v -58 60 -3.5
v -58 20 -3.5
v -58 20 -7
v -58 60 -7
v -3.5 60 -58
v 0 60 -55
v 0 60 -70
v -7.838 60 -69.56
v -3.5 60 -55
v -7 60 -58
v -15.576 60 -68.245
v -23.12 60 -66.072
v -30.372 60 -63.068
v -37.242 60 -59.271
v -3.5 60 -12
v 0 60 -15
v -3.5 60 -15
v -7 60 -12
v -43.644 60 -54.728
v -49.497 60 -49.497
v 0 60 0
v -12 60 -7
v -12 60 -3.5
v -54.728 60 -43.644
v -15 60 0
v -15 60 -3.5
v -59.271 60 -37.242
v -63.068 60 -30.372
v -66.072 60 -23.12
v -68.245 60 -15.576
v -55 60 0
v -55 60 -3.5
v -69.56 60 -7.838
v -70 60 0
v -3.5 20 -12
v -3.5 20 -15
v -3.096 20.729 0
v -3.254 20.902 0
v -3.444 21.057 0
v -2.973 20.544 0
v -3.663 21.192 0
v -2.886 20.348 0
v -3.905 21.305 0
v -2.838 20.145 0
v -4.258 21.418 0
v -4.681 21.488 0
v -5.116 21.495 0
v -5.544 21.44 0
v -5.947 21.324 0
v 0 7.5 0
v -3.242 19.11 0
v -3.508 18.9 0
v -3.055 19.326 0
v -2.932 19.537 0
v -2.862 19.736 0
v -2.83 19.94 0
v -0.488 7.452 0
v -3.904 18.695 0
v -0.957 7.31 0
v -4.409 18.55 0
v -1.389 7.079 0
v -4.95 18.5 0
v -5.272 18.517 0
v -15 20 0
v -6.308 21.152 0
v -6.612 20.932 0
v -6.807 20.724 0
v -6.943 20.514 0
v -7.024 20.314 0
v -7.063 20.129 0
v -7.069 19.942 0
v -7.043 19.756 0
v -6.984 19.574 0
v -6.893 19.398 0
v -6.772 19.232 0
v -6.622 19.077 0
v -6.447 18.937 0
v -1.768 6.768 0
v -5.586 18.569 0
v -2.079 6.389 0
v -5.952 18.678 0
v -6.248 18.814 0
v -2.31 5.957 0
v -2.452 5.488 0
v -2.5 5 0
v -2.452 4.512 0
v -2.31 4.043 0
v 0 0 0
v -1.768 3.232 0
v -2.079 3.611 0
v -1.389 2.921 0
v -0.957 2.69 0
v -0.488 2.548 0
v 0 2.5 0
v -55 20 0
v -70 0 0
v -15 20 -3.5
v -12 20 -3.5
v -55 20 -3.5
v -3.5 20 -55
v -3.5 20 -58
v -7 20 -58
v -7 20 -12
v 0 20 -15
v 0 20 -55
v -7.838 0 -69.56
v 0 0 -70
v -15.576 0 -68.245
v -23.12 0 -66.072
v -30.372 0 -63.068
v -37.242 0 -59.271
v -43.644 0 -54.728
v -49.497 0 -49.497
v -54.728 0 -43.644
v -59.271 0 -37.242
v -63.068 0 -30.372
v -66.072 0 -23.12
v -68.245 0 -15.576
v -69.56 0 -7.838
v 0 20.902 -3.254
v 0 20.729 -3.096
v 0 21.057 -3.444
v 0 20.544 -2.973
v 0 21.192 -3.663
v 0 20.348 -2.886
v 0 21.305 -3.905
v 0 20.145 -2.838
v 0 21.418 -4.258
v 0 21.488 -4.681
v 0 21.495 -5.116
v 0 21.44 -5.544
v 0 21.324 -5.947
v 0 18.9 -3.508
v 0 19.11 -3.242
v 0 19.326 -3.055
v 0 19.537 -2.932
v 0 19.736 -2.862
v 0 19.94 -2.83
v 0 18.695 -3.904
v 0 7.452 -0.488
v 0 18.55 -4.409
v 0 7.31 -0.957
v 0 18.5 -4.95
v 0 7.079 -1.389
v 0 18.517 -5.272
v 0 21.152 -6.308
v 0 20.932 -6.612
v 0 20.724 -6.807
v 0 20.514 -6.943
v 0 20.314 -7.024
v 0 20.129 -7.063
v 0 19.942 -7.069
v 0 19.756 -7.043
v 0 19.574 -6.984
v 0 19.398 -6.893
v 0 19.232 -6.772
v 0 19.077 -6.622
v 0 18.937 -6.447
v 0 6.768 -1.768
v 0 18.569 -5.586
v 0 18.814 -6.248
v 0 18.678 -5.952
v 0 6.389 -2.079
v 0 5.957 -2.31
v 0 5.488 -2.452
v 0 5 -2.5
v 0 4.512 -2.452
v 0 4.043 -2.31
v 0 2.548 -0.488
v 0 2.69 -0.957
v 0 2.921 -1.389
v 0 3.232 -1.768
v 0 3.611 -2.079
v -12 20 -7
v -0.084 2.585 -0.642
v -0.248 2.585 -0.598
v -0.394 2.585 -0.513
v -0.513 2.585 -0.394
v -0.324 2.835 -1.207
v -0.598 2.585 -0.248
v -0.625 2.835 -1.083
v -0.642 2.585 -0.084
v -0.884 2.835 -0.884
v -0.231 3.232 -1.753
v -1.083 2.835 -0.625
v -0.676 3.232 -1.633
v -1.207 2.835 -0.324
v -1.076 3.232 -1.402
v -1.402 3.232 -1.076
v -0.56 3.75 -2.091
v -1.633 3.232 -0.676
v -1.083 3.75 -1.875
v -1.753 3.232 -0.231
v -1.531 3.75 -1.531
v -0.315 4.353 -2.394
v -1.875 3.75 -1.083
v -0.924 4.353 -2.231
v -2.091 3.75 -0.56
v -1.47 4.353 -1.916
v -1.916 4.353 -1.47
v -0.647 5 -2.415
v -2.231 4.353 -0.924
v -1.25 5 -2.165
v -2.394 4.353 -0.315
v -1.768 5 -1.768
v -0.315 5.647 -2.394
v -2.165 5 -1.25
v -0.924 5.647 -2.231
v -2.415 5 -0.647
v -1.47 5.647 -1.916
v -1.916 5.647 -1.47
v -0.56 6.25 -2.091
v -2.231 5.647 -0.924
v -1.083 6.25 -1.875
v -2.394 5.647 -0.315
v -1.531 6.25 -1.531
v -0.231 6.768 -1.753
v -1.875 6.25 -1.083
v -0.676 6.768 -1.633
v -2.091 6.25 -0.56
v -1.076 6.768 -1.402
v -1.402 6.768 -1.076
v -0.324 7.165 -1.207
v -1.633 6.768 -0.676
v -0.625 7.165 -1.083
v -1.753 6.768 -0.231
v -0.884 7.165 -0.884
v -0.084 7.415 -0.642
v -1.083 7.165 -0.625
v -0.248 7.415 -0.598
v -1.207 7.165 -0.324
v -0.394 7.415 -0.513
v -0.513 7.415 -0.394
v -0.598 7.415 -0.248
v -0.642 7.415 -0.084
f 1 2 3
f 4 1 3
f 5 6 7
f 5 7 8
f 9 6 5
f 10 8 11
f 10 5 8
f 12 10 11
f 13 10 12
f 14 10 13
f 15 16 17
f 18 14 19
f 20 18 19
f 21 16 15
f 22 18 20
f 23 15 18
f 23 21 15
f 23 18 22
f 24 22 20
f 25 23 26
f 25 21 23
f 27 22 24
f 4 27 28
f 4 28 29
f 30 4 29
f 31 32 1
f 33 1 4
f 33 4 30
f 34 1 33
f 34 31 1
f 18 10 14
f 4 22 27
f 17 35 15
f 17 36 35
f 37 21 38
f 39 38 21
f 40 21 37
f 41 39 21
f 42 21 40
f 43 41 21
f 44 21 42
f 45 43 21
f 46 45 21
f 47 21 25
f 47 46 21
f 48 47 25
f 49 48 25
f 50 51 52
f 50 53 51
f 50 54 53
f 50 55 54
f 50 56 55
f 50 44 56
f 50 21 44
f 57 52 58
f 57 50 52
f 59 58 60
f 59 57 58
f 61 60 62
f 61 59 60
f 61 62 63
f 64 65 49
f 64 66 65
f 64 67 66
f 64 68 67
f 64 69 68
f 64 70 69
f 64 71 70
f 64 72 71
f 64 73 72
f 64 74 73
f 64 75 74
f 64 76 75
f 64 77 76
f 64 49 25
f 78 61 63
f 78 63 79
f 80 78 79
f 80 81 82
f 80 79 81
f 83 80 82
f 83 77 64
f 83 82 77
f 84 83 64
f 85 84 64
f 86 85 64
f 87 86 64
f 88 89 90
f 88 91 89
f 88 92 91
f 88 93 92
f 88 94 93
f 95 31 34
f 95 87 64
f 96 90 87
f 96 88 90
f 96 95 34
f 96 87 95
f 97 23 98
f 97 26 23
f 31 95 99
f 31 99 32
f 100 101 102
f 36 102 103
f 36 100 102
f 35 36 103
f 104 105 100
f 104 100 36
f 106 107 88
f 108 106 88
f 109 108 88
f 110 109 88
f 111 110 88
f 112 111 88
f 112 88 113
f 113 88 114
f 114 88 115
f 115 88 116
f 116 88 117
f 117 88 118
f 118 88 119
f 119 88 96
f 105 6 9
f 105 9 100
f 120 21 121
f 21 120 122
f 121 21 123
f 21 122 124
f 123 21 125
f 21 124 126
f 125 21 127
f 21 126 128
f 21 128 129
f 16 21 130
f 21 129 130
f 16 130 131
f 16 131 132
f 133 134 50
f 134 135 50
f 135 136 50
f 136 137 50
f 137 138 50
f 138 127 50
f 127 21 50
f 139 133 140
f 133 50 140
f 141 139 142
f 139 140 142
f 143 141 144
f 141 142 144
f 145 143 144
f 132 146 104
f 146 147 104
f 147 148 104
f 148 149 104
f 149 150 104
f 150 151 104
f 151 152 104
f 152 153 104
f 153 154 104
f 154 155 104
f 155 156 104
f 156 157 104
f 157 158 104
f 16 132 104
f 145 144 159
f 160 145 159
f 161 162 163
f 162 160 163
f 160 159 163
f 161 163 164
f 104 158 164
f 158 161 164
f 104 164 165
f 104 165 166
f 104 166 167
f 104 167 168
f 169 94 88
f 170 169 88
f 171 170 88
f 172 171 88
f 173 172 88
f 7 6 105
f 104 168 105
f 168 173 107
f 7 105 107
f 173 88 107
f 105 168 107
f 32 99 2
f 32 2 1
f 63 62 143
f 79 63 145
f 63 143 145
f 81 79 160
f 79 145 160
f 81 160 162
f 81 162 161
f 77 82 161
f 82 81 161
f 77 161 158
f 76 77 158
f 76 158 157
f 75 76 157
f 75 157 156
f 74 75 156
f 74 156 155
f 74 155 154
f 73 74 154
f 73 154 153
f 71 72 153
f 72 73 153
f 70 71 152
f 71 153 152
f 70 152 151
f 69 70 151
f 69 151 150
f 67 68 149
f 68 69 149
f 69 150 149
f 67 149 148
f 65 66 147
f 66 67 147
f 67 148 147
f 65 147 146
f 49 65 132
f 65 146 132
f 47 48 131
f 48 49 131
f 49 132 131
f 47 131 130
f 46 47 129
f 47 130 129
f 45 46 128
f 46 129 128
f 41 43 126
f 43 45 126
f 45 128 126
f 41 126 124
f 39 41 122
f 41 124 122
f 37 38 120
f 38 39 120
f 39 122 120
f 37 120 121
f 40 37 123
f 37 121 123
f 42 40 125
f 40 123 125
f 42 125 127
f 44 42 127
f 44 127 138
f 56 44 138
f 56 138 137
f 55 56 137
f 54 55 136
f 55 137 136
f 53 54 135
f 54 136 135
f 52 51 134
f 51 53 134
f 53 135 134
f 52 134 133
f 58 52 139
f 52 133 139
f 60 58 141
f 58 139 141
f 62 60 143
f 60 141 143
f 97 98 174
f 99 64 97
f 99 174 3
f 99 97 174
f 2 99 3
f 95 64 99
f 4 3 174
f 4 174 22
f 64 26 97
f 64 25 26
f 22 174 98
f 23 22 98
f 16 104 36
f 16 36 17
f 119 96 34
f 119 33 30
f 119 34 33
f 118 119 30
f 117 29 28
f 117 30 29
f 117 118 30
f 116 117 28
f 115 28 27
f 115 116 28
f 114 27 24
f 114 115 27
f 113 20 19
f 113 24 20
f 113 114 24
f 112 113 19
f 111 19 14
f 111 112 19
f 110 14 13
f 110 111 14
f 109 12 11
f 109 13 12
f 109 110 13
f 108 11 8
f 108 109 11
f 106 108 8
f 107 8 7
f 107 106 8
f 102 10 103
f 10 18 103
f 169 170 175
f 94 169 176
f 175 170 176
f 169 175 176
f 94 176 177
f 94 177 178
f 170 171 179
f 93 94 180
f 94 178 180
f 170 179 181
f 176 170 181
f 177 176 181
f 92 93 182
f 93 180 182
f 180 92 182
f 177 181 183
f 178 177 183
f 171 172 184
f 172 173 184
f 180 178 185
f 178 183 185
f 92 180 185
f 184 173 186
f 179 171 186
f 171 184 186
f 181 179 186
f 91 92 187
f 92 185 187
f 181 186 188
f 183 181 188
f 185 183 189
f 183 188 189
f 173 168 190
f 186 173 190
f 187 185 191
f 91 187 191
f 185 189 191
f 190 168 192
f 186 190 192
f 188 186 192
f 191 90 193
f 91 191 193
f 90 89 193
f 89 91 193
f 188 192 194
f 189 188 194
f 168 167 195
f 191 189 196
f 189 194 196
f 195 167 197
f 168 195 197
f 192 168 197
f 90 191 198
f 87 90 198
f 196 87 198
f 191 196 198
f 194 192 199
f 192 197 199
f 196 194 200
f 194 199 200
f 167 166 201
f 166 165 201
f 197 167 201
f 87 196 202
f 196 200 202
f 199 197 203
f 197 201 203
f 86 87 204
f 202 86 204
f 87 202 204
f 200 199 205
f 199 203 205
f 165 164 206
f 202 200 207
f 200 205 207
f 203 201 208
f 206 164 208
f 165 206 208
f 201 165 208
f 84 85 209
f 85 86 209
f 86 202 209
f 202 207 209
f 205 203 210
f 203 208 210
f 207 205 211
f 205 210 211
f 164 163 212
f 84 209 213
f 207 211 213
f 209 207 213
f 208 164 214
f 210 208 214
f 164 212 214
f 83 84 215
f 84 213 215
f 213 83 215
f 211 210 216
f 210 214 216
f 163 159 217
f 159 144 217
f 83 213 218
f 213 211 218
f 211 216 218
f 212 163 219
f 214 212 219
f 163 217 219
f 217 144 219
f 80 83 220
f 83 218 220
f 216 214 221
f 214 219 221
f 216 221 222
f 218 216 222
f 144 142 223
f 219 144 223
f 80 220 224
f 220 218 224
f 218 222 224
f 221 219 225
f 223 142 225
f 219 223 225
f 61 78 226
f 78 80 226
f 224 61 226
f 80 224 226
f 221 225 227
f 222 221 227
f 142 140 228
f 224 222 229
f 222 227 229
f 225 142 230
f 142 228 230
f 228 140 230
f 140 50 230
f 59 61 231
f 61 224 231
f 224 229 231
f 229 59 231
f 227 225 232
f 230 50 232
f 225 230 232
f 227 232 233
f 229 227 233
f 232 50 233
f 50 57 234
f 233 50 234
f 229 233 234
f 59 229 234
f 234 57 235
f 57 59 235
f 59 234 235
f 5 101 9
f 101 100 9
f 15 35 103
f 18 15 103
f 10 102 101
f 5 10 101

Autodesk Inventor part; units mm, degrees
ref_plane "YZ Plane" through (0, 0, 0) normal (1, 0, 0) x (0, 1, 0)
ref_plane "XZ Plane" through (0, 0, 0) normal (0, 1, 0) x (-1, 0, 0)
ref_plane "XY Plane" through (0, 0, 0) normal (0, 0, 1) x (1, 0, 0)
sketch "Sketch1" plane through (0, 0, 0) normal (0, 1, 0) x (-1, 0, 0)
  line L0 (0, 0) -> (70, 0)
  line L1 (0, 0) -> (0, -70)
  arc A0 (0, -70) -> (70, 0) centre (0, 0) ccw
  dimension "d0" = 70
  dimension "d1" = 70
  dimension "d3" = 70
extrude "Extrusion1" add sketch "Sketch1" along normal blind 60
sketch "Sketch2" plane through (0, 0, 0) normal (1, 0, 0) x (0, 0, -1)
  line L0 (15, 60) -> (55, 60)
  line L1 (55, 60) -> (55, 20)
  line L2 (55, 20) -> (15, 20)
  line L3 (15, 20) -> (15, 60)
  line L4 (0, 60) -> (70, 60) projected
  line L5 (0, 0) -> (0, 60) projected
  dimension "d8" = 40
  dimension "d9" = 40
  dimension "d10" = 15
extrude "Extrusion2" cut sketch "Sketch2" against normal blind 7
sketch "Sketch3" plane through (-70, 0, 0) normal (0, 0, 1) x (1, 0, 0)
  line L0 (15, 60) -> (55, 60)
  line L1 (55, 60) -> (55, 20)
  line L2 (55, 20) -> (15, 20)
  line L3 (15, 20) -> (15, 60)
  line L4 (0, 60) -> (70, 60) projected
  line L5 (0, 0) -> (0, 60) projected
  point P0 (70, 0)
  point P1 (35, 20)
  point P2 (35, 60)
  dimension "d11" = 40
  dimension "d13" = 40
  dimension "d31" = 15
extrude "Extrusion3" cut sketch "Sketch3" against normal blind 7
sketch "Sketch4" plane through (0, 20, -55) normal (0, 0, 1) x (1, 0, 0)
  line L0 (-3.5, 40) -> (-7, 40)
  line L1 (-7, 40) -> (-7, 0)
  line L2 (-7, 0) -> (-3.5, 0)
  line L3 (-3.5, 0) -> (-3.5, 40)
  line L4 (0, 40) -> (0, 0) projected
  line L5 (-7, 40) -> (0, 40) projected
  line L6 (0, 0) -> (-7, 0) projected
  line L7 (-7, 40) -> (-7, 0) projected
  point P0 (0, -20)
  dimension "d16" = 3.5
extrude "Extrusion4" cut sketch "Sketch4" against normal blind 3 contours L3 L2 L1 L0
sketch "Sketch5" plane through (0, 20, -15) normal (0, 0, -1) x (-1, 0, 0)
  line L0 (3.5, 40) -> (7, 40)
  line L1 (7, 0) -> (3.5, 0)
  line L2 (3.5, 0) -> (3.5, 40)
  line L3 (3.5, 40) -> (7, 40)
  line L4 (7, 40) -> (7, 0)
  line L5 (0, 0) -> (7, 0) projected
  line L6 (7, 0) -> (7, 40) projected
  point P0 (0, -20)
  dimension "d4" = 60
  dimension "d19" = 3.5
extrude "Extrusion5" cut sketch "Sketch5" against normal blind 3
sketch "Sketch8" plane through (-15, 20, 0) normal (-1, 0, 0) x (0, 0, 1)
  line L0 (-7, 40) -> (-3.5, 40)
  line L1 (-3.5, 40) -> (-3.5, 0)
  line L2 (-3.5, 0) -> (-7, 0)
  line L3 (-7, 0) -> (-7, 40)
  line L4 (-7, 40) -> (0, 40) projected
  line L5 (-7, 40) -> (-7, 0) projected
  line L6 (0, 0) -> (-7, 0) projected
  point P0 (0, -20)
  dimension "d28" = 3.5
extrude "Extrusion8" cut sketch "Sketch8" against normal blind 3
sketch "Sketch9" plane through (-55, 20, 0) normal (1, 0, 0) x (0, 0, -1)
  line L0 (3.5, 40) -> (7, 40)
  line L1 (7, 40) -> (7, 0)
  line L2 (7, 0) -> (3.5, 0)
  line L3 (3.5, 0) -> (3.5, 40)
  line L4 (0, 40) -> (7, 40) projected
  line L5 (7, 0) -> (7, 40) projected
  line L6 (0, 0) -> (7, 0) projected
  point P0 (0, -20)
  dimension "d32" = 3.5
extrude "Extrusion9" cut sketch "Sketch9" against normal blind 3
sketch "Sketch10" plane through (0, 0, 0) normal (1, 0, 0) x (0, 0, -1)
  line L0 (0, 0) -> (0, 60) projected
  arc A0 (0, 2.5) -> (0, 7.5) centre (0, 5) ccw
  line L1 (70, 0) -> (0, 0) projected
  line L2 (0, 7.5) -> (0, 2.5)
  dimension "d35" = 5
  dimension "d36" = 5
revolve "Revolution1" cut sketch "Sketch10" angle 360 about axis through (0, 0, 0) along (0, 1, 0)
ref_plane "Work Plane1" through (0, 60, 0) normal (0.7071, 0, -0.7071) x (0, -1, 0)
sketch "Sketch11" plane through (0, 60, 0) normal (0.7071, 0, -0.7071) x (0, -1, 0)
  circle A0 centre (40, 3.5) radius 1.5
  line L0 (52.5, 0) -> (0, 0) projected
  line L1 (60, 49.4975) -> (60, 0) projected
  dimension "d38" = 3
  dimension "d41" = 3.5
  dimension "d42" = 20
extrude "Extrusion10" cut sketch "Sketch11" along normal mid plane 10
properties part number "Ecke"
